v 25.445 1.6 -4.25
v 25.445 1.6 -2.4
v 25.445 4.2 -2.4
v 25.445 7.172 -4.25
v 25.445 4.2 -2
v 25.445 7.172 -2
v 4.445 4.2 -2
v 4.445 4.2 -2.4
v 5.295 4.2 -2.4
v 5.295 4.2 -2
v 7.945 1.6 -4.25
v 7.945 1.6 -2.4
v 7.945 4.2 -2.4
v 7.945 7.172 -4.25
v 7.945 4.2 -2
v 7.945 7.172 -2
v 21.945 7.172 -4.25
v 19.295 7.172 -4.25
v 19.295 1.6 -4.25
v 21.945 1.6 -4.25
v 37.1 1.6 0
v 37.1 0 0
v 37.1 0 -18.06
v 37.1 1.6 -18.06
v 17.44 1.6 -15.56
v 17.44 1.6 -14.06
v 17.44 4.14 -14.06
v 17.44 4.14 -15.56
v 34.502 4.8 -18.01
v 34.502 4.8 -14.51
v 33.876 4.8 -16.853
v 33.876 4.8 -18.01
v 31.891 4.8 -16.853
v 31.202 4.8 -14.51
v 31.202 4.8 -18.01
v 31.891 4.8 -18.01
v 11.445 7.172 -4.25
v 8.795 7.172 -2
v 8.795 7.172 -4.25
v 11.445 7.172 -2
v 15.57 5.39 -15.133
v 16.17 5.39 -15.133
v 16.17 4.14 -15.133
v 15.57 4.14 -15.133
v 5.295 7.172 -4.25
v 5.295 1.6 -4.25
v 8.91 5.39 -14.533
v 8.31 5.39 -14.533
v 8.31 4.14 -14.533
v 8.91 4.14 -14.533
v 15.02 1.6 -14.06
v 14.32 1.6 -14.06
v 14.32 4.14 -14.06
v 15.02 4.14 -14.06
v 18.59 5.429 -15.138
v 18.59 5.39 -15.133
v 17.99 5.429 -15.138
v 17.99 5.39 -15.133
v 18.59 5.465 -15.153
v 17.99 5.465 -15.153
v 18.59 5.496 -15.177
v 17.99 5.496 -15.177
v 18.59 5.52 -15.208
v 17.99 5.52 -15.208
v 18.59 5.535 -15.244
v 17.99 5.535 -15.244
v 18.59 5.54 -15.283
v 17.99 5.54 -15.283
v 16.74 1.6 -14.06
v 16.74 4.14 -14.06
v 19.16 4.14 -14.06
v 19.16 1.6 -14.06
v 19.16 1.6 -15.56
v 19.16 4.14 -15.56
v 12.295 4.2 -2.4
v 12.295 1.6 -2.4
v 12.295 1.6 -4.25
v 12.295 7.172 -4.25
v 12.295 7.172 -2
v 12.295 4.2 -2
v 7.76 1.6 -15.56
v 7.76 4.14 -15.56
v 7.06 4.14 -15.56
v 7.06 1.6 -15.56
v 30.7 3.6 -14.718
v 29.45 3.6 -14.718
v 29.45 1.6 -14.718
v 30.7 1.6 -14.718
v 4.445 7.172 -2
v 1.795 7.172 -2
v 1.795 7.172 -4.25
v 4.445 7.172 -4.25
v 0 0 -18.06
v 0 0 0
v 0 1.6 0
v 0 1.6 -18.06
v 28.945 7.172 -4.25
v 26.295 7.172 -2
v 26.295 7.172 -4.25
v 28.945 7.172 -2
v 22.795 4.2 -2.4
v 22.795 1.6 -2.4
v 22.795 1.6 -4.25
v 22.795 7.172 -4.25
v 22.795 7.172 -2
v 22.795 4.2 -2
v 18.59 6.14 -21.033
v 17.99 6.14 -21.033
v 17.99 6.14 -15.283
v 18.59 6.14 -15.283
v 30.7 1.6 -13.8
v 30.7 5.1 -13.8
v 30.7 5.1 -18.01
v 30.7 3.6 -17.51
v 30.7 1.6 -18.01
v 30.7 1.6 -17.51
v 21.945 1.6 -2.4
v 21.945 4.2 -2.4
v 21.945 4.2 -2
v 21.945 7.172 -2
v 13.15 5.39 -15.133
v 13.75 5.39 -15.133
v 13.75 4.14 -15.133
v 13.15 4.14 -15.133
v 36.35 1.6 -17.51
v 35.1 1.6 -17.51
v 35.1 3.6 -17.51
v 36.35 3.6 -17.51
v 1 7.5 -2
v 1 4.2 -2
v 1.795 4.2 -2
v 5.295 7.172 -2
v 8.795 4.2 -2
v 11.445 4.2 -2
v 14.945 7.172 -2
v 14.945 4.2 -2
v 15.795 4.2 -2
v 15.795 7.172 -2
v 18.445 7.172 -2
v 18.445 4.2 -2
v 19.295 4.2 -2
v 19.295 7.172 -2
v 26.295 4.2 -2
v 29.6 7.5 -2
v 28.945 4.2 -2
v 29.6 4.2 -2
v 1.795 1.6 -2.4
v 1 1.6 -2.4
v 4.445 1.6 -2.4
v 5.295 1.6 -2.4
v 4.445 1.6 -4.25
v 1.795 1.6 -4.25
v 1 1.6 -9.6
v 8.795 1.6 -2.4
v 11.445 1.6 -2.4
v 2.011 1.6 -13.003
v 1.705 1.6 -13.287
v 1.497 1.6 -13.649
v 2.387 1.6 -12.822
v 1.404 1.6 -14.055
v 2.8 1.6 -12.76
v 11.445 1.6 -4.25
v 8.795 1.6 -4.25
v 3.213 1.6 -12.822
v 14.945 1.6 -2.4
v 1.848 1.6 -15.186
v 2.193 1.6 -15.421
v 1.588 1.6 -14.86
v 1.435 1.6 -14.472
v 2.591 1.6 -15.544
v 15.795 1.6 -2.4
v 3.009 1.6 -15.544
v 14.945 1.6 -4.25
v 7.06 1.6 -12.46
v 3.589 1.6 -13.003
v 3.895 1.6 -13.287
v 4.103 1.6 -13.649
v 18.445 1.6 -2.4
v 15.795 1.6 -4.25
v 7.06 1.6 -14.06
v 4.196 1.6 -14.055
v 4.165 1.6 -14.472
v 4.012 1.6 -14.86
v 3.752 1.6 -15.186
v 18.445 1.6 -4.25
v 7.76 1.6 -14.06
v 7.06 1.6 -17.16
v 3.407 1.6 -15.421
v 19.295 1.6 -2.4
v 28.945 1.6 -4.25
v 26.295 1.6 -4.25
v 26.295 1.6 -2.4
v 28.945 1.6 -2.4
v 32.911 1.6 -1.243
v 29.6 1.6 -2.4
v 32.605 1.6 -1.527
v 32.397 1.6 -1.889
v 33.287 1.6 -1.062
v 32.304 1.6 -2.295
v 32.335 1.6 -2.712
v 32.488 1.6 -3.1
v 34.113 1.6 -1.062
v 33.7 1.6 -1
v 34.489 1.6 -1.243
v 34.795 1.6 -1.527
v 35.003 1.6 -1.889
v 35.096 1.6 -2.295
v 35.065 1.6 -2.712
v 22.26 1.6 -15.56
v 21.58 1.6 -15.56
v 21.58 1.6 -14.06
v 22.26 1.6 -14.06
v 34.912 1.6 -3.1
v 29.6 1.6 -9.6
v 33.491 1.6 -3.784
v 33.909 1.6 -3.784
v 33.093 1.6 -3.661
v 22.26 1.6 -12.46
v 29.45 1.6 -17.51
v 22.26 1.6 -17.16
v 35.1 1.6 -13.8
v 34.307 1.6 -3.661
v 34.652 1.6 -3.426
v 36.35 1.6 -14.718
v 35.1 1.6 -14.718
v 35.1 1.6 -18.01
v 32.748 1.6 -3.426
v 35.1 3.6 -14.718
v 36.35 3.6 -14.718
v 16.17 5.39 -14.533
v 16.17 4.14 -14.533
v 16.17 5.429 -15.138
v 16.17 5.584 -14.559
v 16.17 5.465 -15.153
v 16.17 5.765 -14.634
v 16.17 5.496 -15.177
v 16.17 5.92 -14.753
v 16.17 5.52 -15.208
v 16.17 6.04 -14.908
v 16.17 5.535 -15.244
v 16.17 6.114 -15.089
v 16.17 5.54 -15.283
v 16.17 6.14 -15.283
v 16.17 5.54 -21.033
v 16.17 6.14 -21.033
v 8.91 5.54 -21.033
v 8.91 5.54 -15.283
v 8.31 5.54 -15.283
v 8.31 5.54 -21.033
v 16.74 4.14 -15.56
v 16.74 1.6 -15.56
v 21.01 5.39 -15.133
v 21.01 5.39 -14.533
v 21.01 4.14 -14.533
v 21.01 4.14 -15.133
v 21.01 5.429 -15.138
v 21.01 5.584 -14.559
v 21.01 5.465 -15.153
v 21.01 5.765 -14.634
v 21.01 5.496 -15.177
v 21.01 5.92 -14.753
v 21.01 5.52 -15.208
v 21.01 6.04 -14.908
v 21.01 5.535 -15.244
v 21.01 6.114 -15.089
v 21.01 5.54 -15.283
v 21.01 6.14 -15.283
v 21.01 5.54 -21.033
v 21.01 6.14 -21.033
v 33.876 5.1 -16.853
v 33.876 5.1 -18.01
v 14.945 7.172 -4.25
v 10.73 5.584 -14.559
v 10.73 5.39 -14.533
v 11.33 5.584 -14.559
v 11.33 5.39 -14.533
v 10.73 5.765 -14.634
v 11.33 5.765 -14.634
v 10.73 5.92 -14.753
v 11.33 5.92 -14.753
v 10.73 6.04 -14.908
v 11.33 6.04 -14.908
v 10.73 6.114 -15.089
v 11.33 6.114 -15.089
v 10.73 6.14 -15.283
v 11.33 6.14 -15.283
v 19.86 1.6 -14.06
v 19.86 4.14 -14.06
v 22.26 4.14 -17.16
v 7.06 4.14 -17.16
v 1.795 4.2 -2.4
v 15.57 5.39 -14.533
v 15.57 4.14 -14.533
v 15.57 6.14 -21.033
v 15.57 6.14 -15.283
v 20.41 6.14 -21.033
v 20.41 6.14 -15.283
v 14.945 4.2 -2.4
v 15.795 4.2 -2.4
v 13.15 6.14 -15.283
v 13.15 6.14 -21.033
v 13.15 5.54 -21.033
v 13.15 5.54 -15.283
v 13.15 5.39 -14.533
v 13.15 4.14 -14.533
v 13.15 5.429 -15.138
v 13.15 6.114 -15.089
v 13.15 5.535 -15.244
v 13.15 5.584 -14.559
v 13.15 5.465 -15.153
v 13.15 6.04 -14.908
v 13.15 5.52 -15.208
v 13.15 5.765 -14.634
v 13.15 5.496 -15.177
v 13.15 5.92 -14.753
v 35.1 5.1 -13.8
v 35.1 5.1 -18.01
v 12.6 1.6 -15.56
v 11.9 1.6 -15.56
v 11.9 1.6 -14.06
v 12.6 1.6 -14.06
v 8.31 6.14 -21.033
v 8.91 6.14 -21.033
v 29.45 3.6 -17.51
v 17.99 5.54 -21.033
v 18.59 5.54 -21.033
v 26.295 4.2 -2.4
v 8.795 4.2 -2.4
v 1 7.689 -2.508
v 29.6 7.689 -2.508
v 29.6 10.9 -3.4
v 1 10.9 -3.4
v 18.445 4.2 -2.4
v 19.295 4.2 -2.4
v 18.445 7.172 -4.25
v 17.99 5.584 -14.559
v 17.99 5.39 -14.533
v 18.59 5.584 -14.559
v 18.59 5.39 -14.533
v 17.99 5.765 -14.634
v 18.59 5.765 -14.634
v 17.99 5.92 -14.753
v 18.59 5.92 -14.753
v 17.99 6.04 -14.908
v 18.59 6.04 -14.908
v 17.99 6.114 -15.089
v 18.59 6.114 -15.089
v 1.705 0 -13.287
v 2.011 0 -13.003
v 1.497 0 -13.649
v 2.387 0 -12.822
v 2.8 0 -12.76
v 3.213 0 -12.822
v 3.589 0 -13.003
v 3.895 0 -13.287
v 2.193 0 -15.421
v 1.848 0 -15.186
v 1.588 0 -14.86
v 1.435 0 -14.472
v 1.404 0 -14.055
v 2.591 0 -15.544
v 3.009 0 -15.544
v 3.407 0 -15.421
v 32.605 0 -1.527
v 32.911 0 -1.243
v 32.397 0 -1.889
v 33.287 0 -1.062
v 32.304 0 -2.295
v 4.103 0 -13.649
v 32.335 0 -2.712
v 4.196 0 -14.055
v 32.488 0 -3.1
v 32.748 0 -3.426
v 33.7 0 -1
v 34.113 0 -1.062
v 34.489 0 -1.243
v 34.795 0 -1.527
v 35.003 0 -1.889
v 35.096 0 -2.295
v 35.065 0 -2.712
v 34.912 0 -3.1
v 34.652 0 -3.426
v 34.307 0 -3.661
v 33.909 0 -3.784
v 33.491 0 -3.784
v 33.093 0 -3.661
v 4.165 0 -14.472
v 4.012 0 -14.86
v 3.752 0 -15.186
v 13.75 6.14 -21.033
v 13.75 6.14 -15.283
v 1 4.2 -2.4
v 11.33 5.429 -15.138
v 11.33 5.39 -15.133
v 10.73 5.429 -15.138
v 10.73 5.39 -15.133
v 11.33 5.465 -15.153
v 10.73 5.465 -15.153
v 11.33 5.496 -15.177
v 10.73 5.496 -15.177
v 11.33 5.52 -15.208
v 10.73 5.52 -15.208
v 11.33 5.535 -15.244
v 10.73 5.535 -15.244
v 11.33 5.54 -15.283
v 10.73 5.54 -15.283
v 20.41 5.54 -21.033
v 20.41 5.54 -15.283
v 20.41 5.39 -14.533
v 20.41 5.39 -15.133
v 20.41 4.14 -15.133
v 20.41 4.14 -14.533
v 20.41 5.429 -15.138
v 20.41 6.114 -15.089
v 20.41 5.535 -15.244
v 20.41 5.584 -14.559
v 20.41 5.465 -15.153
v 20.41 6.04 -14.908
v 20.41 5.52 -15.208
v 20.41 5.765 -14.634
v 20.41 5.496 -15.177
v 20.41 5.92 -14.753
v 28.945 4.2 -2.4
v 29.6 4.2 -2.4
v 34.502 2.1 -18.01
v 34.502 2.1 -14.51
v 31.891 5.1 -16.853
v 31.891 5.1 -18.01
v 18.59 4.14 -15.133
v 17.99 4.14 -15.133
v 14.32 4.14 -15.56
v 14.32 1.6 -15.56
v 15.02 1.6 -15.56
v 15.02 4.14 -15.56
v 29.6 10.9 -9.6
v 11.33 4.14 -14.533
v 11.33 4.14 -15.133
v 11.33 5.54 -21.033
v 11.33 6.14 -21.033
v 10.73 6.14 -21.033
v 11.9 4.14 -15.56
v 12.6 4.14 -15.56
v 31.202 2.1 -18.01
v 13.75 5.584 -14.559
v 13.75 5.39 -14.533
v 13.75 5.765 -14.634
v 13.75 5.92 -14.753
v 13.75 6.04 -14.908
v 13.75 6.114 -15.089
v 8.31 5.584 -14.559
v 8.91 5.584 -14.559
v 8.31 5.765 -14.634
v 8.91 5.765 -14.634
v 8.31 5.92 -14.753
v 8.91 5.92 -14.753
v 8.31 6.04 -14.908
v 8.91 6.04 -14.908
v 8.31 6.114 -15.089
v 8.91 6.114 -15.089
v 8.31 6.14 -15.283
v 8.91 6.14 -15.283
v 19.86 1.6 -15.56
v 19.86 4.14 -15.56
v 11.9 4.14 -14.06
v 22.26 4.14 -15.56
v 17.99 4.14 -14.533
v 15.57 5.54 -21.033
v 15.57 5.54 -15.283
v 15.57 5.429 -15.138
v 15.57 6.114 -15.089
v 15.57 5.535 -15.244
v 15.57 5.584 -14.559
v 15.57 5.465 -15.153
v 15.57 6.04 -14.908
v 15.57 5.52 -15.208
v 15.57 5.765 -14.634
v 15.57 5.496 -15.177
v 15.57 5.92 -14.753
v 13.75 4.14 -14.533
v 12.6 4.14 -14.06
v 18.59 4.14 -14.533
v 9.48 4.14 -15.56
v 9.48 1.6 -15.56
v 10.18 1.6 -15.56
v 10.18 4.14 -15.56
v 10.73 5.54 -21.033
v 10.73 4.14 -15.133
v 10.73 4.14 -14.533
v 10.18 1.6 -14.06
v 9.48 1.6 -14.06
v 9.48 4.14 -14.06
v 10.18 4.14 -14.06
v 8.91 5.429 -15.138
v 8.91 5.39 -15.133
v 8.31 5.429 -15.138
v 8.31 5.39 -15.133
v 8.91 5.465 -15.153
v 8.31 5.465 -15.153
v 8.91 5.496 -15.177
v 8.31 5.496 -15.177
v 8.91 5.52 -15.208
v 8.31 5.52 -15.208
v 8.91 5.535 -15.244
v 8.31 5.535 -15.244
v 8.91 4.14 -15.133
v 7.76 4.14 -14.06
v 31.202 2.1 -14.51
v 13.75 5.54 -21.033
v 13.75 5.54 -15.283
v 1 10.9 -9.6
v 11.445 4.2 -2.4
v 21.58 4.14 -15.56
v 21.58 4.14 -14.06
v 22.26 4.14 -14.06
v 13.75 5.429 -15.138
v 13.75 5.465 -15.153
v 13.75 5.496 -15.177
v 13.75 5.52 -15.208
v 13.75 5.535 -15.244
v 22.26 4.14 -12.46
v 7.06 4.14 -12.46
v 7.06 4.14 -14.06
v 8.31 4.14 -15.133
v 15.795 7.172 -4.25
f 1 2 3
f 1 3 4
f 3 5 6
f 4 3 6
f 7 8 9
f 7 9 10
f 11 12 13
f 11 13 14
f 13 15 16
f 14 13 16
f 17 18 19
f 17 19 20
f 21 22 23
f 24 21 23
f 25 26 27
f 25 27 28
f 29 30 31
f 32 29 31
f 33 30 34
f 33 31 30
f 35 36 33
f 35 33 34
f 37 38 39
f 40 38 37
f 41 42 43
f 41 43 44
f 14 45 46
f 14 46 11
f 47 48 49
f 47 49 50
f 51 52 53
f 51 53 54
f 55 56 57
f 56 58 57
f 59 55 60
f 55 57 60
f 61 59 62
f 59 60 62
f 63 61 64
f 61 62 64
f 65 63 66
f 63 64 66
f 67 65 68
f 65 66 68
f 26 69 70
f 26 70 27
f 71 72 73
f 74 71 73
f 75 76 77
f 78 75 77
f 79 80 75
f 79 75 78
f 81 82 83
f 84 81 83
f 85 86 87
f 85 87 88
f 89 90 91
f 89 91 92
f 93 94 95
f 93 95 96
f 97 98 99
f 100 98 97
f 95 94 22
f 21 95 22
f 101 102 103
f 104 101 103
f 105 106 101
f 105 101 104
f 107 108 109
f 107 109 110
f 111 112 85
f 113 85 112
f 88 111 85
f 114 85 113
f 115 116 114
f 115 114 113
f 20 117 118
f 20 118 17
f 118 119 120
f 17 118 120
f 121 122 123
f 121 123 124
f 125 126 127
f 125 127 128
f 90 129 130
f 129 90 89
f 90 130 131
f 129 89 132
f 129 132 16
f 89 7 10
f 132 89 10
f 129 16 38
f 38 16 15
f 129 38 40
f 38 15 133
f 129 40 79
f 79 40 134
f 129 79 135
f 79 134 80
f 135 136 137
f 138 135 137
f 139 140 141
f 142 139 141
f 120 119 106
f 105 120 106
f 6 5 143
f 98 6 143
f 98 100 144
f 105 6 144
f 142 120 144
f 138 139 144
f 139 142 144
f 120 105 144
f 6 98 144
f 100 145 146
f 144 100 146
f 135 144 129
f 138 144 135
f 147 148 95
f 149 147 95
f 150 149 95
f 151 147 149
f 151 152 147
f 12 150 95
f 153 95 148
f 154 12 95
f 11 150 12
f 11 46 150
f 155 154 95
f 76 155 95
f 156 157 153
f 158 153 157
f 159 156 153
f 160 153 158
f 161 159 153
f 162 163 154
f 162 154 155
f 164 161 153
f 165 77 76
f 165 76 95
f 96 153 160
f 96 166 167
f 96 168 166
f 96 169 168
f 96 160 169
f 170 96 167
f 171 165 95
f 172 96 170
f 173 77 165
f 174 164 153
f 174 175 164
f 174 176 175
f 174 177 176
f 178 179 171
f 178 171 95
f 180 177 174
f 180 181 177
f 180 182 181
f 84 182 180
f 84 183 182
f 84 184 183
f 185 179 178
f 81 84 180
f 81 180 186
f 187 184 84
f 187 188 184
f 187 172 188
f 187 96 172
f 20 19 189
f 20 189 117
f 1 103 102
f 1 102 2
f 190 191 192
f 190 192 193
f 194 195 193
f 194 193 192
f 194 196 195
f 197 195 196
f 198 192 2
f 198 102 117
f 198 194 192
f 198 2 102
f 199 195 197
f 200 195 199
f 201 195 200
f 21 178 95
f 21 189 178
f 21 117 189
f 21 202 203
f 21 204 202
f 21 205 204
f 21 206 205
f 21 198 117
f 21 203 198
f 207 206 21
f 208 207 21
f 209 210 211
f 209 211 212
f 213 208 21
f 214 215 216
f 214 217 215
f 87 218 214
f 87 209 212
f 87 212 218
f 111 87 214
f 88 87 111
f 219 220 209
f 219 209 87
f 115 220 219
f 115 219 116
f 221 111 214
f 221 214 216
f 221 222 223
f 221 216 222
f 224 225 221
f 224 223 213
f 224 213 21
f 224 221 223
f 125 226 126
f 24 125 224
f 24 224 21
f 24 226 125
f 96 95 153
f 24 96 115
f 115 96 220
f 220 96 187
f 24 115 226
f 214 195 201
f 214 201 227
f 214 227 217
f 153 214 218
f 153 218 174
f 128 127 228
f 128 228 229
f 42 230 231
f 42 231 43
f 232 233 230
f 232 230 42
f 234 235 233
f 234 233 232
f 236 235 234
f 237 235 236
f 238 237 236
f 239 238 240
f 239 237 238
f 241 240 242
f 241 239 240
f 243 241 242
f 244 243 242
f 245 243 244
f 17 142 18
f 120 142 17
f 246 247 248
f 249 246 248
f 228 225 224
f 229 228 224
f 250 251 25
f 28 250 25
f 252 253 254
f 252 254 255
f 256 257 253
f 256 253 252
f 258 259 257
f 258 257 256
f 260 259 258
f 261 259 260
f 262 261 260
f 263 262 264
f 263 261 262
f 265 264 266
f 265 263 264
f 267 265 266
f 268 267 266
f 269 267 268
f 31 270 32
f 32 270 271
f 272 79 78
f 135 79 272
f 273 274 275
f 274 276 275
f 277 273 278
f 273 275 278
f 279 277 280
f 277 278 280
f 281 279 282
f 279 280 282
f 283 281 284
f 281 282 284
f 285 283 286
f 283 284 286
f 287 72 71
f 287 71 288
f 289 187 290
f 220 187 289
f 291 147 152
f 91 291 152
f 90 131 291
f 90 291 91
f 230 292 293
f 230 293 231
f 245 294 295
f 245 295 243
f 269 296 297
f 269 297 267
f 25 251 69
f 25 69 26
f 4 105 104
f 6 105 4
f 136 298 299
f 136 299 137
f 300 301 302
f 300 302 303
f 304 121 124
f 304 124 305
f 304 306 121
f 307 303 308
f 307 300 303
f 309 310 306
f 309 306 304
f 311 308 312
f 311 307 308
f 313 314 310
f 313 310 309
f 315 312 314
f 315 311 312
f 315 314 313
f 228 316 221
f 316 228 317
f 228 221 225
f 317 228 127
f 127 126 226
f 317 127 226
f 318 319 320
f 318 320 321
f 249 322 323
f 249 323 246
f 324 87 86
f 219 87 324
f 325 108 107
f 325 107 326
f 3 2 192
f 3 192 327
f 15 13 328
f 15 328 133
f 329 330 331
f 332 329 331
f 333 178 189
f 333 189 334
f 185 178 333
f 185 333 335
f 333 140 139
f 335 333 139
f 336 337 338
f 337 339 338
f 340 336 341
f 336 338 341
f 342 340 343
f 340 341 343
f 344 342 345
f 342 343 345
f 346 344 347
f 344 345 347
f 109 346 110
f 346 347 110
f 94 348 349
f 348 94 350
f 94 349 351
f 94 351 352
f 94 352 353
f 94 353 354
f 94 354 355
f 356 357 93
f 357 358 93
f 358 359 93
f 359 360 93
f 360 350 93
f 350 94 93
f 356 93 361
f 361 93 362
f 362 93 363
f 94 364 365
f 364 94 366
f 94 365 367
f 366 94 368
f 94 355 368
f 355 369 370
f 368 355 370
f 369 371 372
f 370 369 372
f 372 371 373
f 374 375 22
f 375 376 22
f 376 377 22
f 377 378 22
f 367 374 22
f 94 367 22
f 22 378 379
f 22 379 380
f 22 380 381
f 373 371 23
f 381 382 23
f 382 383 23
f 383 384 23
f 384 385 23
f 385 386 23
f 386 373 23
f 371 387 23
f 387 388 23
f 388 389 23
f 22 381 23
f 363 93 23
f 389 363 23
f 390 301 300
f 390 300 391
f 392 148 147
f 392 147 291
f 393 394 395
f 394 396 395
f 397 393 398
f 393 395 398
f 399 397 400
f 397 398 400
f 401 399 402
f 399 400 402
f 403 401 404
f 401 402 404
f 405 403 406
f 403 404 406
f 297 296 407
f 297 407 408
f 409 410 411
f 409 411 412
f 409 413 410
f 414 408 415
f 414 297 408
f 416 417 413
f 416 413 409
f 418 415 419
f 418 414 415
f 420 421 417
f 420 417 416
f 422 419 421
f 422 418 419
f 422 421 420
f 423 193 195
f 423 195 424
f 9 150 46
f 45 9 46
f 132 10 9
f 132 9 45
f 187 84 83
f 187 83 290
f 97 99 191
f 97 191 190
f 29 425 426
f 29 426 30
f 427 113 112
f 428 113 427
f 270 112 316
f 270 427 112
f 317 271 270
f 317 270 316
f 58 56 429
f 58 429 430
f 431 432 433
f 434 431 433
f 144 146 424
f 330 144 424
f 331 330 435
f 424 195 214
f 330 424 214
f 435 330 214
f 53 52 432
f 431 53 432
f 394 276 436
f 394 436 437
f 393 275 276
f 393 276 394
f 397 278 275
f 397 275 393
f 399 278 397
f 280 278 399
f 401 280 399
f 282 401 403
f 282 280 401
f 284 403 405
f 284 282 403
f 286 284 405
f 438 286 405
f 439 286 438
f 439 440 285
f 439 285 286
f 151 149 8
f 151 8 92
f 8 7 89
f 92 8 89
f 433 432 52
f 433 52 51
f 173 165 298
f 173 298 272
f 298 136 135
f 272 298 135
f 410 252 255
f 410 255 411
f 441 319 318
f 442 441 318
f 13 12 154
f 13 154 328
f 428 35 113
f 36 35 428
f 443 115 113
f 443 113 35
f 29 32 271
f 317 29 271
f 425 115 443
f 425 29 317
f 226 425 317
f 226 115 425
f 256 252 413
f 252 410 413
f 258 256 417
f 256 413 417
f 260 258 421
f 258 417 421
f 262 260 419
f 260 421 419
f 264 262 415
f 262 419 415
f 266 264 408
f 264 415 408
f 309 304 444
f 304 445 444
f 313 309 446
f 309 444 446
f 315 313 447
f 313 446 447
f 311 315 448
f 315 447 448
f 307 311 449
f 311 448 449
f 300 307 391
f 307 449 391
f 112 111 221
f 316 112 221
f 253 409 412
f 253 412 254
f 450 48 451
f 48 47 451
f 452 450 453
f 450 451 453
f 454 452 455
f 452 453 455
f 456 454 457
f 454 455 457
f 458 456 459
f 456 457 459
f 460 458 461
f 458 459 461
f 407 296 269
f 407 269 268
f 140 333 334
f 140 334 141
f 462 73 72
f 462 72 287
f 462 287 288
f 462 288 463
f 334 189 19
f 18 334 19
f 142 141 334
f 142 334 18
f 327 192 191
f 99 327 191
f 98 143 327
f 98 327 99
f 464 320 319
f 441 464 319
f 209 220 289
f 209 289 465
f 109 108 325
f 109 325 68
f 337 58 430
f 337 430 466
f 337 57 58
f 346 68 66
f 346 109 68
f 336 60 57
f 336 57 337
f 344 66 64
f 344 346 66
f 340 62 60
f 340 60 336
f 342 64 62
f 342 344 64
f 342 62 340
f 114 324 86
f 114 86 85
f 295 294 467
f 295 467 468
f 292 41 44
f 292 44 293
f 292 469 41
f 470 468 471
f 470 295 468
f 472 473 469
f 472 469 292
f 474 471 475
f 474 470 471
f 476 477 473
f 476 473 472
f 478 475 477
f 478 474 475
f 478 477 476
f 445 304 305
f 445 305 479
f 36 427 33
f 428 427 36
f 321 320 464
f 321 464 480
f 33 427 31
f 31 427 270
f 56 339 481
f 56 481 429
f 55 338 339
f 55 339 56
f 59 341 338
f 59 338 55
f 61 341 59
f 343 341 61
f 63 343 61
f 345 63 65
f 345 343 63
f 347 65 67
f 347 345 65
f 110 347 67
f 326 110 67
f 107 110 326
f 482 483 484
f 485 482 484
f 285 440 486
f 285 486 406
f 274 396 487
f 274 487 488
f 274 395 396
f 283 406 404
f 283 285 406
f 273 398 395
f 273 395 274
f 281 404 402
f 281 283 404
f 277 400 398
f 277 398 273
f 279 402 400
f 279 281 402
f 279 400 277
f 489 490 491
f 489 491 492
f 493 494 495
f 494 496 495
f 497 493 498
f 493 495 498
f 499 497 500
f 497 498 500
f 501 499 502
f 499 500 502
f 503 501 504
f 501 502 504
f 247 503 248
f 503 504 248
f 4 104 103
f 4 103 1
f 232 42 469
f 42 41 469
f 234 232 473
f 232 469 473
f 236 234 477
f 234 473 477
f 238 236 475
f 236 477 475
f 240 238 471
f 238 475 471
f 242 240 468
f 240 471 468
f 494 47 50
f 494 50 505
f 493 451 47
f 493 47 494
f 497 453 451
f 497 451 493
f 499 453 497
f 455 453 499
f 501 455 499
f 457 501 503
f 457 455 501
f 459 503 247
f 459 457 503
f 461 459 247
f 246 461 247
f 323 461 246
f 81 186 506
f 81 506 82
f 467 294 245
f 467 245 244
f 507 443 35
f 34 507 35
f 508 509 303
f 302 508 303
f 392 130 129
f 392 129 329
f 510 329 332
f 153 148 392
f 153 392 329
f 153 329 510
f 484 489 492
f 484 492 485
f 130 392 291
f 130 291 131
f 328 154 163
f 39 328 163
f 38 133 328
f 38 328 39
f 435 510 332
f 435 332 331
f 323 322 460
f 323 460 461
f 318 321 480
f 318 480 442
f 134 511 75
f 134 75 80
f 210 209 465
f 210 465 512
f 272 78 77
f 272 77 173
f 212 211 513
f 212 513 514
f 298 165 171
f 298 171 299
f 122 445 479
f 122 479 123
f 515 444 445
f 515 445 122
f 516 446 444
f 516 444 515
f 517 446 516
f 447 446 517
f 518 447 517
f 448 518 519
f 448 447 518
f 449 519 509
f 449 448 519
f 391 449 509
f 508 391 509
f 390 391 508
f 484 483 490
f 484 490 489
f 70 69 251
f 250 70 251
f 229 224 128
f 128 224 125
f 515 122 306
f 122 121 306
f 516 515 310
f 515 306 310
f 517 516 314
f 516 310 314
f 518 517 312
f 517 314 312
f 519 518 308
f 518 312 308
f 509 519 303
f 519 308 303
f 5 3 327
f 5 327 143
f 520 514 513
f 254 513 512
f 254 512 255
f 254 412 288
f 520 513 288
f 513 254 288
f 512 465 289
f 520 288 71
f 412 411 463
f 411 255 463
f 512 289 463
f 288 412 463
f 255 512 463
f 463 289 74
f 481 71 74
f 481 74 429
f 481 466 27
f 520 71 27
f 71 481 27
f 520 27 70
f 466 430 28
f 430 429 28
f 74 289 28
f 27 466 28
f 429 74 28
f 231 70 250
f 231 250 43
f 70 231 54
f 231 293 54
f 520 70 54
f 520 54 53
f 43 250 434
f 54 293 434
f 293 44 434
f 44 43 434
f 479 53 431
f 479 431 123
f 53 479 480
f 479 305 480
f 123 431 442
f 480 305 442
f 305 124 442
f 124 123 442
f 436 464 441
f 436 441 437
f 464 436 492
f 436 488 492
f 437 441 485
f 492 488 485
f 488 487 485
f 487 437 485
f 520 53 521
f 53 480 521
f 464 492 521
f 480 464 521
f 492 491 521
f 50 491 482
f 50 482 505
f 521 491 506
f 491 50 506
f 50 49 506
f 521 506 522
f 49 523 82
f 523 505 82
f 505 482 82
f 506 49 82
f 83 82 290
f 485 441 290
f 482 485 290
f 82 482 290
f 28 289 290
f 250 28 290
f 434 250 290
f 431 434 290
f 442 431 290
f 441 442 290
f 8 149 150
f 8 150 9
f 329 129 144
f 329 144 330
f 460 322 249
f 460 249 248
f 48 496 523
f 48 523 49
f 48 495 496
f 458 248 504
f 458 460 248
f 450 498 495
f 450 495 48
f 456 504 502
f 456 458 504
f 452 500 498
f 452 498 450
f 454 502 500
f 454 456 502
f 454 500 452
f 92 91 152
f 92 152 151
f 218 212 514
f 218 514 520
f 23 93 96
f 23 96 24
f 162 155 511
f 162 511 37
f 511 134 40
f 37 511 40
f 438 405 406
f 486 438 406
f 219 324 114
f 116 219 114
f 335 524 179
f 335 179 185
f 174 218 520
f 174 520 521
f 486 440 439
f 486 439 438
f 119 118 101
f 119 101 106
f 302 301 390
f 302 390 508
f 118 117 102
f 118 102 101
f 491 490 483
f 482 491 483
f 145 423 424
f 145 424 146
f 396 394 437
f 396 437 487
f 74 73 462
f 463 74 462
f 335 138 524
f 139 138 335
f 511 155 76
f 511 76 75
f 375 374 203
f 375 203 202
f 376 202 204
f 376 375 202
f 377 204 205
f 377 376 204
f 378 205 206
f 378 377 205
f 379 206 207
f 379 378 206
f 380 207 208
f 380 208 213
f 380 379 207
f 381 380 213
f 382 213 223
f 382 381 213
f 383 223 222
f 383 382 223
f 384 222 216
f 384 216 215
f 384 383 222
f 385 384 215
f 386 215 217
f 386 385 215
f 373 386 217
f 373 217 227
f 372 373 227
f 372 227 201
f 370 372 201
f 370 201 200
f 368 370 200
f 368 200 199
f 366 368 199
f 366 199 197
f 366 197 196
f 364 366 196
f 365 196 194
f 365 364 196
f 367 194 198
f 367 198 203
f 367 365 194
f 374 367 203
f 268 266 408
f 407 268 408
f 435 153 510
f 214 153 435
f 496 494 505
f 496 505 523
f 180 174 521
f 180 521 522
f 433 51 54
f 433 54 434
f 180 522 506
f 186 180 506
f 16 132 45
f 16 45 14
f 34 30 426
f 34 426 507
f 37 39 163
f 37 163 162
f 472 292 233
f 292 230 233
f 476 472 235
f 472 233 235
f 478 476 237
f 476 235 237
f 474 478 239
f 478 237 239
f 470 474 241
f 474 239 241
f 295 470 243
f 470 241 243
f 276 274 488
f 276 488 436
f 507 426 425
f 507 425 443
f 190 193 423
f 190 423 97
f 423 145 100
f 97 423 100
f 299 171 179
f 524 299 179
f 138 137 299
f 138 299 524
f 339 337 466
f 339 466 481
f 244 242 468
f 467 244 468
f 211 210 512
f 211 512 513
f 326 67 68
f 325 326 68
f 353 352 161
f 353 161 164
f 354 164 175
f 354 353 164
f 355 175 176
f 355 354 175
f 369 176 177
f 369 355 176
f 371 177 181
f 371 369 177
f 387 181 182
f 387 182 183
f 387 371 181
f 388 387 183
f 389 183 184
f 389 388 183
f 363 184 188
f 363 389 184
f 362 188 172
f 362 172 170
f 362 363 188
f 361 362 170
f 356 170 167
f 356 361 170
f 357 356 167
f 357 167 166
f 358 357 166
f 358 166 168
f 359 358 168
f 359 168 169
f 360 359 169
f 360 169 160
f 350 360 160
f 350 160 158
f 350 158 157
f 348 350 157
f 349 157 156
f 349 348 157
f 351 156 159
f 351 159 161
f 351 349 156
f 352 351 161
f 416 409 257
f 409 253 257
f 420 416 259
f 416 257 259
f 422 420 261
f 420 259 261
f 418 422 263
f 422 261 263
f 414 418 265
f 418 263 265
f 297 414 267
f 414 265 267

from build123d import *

# Parameters (mm, degrees)
SKETCH1_W           = 37.1
SKETCH1_H           = 18.06
SKETCH1_R           = 1.4
BOSS_EXTRUDE1_DEPTH = 1.6
SKETCH2_W           = 0.7
SKETCH2_H           = 1.5
BOSS_EXTRUDE2_DEPTH = 2.54
SKETCH4_W           = 0.6
SKETCH4_H           = 0.6
LPATTERN1_COUNT     = 6
LPATTERN1_PITCH     = 2.42
SKETCH6_W           = 28.6
SKETCH6_H           = 7.6
BOSS_EXTRUDE3_DEPTH = 9.3
CUT_EXTRUDE1_REACH  = 38.1
SKETCH7_W           = 0.4
SKETCH7_H           = 2.6
SKETCH8_W           = 2.65
SKETCH8_H           = 5.571671588
CUT_EXTRUDE2_DEPTH  = 2.25
SKETCH9_W           = 4.4
SKETCH9_H           = 4.21
BOSS_EXTRUDE4_DEPTH = 3.5
SKETCH10_W          = 6.9
SKETCH10_H          = 2.792271398
BOSS_EXTRUDE5_DEPTH = 2
SKETCH11_W          = 3.3
SKETCH11_H          = 2.7
CUT_EXTRUDE3_DEPTH  = 3.5
CUT_EXTRUDE4_REACH  = 7.1
SKETCH12_W          = 1.985213288
SKETCH12_H          = 1.157017581


with BuildPart() as part:
    # Sketch1 → Boss-Extrude1 (new body)
    with BuildSketch(Plane(origin=(0, 0, 0), x_dir=(1, 0, 0), z_dir=(0, 1, 0))):
        with Locations((18.55, 9.03)):
            Rectangle(SKETCH1_W, SKETCH1_H)
        with Locations(Location((33.7, 2.4, 0), (0, 0, 270))):  # turned: the seam where the file's is
            Circle(SKETCH1_R, mode=Mode.SUBTRACT)
        with Locations(Location((2.8, 14.16, 0), (0, 0, 270))):  # turned: the seam where the file's is
            Circle(SKETCH1_R, mode=Mode.SUBTRACT)
    extrude(amount=BOSS_EXTRUDE1_DEPTH)

    # Sketch2 → Boss-Extrude2 (add)
    with BuildSketch(Plane(origin=(0, 1.6, 0), x_dir=(1, 0, 0), z_dir=(0, 1, 0))):
        Polygon((7.060184456, 17.16), (22.260184456, 17.16), (22.260184456, 15.56), (21.580184456, 15.56), (21.580184456, 14.06), (22.260184456, 14.06), (22.260184456, 12.46), (7.060184456, 12.46), (7.060184456, 14.06), (7.760184456, 14.06), (7.760184456, 15.56), (7.060184456, 15.56), align=None)
        with Locations((9.830184456, 14.81)):
            Rectangle(SKETCH2_W, SKETCH2_H, mode=Mode.SUBTRACT)
        with Locations((12.250184456, 14.81)):
            Rectangle(SKETCH2_W, SKETCH2_H, mode=Mode.SUBTRACT)
        with Locations((14.670184456, 14.81)):
            Rectangle(SKETCH2_W, SKETCH2_H, mode=Mode.SUBTRACT)
        with Locations((17.090184456, 14.81)):
            Rectangle(SKETCH2_W, SKETCH2_H, mode=Mode.SUBTRACT)
        with Locations((19.510184456, 14.81)):
            Rectangle(SKETCH2_W, SKETCH2_H, mode=Mode.SUBTRACT)
    extrude(amount=BOSS_EXTRUDE2_DEPTH)

    # Sweep1: sweep along a path in Sketch3
    with BuildLine(Plane.ZY.offset(-8.610184456)) as sweep1_path:
        Line((-14.533057121, 4.14), (-14.533057121, 5.39))
        ThreePointArc((-14.533057121, 5.39), (-14.752727035, 5.920330086), (-15.283057121, 6.14))
        Line((-15.283057121, 6.14), (-21.033057121, 6.14))
    # Sketch4 → Sweep1 (sweep)
    with BuildSketch(Plane(origin=(0, 4.14, 0), x_dir=(1, 0, 0), z_dir=(0, 1, 0))):
        with Locations((8.610184456, 14.833057121)):
            Rectangle(SKETCH4_W, SKETCH4_H)
    sweep1 = sweep(path=sweep1_path.line)

    # LPattern1: Sweep1 ×6
    with Locations(*[(i * LPATTERN1_PITCH, 0, 0) for i in range(1, LPATTERN1_COUNT)]):
        add(sweep1)

    # Sketch6 → Boss-Extrude3 (add)
    with BuildSketch(Plane(origin=(0, 1.6, 0), x_dir=(1, 0, 0), z_dir=(0, 1, 0))):
        with Locations((15.3, 5.8)):
            Rectangle(SKETCH6_W, SKETCH6_H)
    extrude(amount=BOSS_EXTRUDE3_DEPTH)

    # Sketch7 → Cut-Extrude1 (cut, up to next)
    with BuildSketch(Plane.ZY.offset(-1), mode=Mode.PRIVATE) as cut_extrude1_sk1:
        Polygon((-2, 7.5), (-2.508141267, 7.68870454), (-3.4, 10.9), (-2, 10.9), align=None)
    cut_extrude1_tool1 = extrude(cut_extrude1_sk1.sketch, amount=-CUT_EXTRUDE1_REACH, mode=Mode.PRIVATE) & part.part
    add(cut_extrude1_tool1.solids().sort_by_distance((1, 9.514948, -2.506498))[0], mode=Mode.SUBTRACT)
    # Sketch7 → Cut-Extrude1 (cut, up to next)
    with BuildSketch(Plane.ZY.offset(-1), mode=Mode.PRIVATE) as cut_extrude1_sk2:
        with Locations((-2.2, 2.9)):
            Rectangle(SKETCH7_W, SKETCH7_H)
    cut_extrude1_tool2 = extrude(cut_extrude1_sk2.sketch, amount=-CUT_EXTRUDE1_REACH, mode=Mode.PRIVATE) & part.part
    add(cut_extrude1_tool2.solids().sort_by_distance((1, 2.9, -2.2))[0], mode=Mode.SUBTRACT)

    # Sketch8 → Cut-Extrude2 (cut)
    with BuildSketch(Plane.XY.offset(-2)):
        with Locations((3.120484252, 4.385835794)):
            Rectangle(SKETCH8_W, SKETCH8_H)
        with Locations((6.620484252, 4.385835794)):
            Rectangle(SKETCH8_W, SKETCH8_H)
        with Locations((10.120484252, 4.385835794)):
            Rectangle(SKETCH8_W, SKETCH8_H)
        with Locations((13.620484252, 4.385835794)):
            Rectangle(SKETCH8_W, SKETCH8_H)
        with Locations((17.120484252, 4.385835794)):
            Rectangle(SKETCH8_W, SKETCH8_H)
        with Locations((20.620484252, 4.385835794)):
            Rectangle(SKETCH8_W, SKETCH8_H)
        with Locations((24.120484252, 4.385835794)):
            Rectangle(SKETCH8_W, SKETCH8_H)
        with Locations((27.620484252, 4.385835794)):
            Rectangle(SKETCH8_W, SKETCH8_H)
    extrude(amount=-CUT_EXTRUDE2_DEPTH, mode=Mode.SUBTRACT)

    # Sketch9 → Boss-Extrude4 (add)
    with BuildSketch(Plane(origin=(0, 1.6, 0), x_dir=(1, 0, 0), z_dir=(0, 1, 0))):
        with Locations((32.9, 15.905)):
            Rectangle(SKETCH9_W, SKETCH9_H)
    extrude(amount=BOSS_EXTRUDE4_DEPTH)

    # Sketch10 → Boss-Extrude5 (add)
    with BuildSketch(Plane(origin=(0, 1.6, 0), x_dir=(1, 0, 0), z_dir=(0, 1, 0))):
        with Locations((32.9, 16.113864301)):
            Rectangle(SKETCH10_W, SKETCH10_H)
    extrude(amount=BOSS_EXTRUDE5_DEPTH)

    # Sketch11 → Cut-Extrude3 (cut)
    with BuildSketch(Plane(origin=(0, 0, -18.01), x_dir=(-1, 0, 0), z_dir=(0, 0, -1))):
        with Locations((-32.852042443, 3.45)):
            Rectangle(SKETCH11_W, SKETCH11_H)
    extrude(amount=-CUT_EXTRUDE3_DEPTH, mode=Mode.SUBTRACT)

    # Sketch12 → Cut-Extrude4 (cut, up to next)
    with BuildSketch(Plane(origin=(0, 5.1, 0), x_dir=(1, 0, 0), z_dir=(0, 1, 0)), mode=Mode.PRIVATE) as cut_extrude4_sk1:
        with Locations((32.883783696, 17.43149121)):
            Rectangle(SKETCH12_W, SKETCH12_H)
    cut_extrude4_tool1 = extrude(cut_extrude4_sk1.sketch, amount=-CUT_EXTRUDE4_REACH, mode=Mode.PRIVATE) & part.part
    add(cut_extrude4_tool1.solids().sort_by_distance((32.883784, 5.1, -17.431491))[0], mode=Mode.SUBTRACT)


solid = part.part
